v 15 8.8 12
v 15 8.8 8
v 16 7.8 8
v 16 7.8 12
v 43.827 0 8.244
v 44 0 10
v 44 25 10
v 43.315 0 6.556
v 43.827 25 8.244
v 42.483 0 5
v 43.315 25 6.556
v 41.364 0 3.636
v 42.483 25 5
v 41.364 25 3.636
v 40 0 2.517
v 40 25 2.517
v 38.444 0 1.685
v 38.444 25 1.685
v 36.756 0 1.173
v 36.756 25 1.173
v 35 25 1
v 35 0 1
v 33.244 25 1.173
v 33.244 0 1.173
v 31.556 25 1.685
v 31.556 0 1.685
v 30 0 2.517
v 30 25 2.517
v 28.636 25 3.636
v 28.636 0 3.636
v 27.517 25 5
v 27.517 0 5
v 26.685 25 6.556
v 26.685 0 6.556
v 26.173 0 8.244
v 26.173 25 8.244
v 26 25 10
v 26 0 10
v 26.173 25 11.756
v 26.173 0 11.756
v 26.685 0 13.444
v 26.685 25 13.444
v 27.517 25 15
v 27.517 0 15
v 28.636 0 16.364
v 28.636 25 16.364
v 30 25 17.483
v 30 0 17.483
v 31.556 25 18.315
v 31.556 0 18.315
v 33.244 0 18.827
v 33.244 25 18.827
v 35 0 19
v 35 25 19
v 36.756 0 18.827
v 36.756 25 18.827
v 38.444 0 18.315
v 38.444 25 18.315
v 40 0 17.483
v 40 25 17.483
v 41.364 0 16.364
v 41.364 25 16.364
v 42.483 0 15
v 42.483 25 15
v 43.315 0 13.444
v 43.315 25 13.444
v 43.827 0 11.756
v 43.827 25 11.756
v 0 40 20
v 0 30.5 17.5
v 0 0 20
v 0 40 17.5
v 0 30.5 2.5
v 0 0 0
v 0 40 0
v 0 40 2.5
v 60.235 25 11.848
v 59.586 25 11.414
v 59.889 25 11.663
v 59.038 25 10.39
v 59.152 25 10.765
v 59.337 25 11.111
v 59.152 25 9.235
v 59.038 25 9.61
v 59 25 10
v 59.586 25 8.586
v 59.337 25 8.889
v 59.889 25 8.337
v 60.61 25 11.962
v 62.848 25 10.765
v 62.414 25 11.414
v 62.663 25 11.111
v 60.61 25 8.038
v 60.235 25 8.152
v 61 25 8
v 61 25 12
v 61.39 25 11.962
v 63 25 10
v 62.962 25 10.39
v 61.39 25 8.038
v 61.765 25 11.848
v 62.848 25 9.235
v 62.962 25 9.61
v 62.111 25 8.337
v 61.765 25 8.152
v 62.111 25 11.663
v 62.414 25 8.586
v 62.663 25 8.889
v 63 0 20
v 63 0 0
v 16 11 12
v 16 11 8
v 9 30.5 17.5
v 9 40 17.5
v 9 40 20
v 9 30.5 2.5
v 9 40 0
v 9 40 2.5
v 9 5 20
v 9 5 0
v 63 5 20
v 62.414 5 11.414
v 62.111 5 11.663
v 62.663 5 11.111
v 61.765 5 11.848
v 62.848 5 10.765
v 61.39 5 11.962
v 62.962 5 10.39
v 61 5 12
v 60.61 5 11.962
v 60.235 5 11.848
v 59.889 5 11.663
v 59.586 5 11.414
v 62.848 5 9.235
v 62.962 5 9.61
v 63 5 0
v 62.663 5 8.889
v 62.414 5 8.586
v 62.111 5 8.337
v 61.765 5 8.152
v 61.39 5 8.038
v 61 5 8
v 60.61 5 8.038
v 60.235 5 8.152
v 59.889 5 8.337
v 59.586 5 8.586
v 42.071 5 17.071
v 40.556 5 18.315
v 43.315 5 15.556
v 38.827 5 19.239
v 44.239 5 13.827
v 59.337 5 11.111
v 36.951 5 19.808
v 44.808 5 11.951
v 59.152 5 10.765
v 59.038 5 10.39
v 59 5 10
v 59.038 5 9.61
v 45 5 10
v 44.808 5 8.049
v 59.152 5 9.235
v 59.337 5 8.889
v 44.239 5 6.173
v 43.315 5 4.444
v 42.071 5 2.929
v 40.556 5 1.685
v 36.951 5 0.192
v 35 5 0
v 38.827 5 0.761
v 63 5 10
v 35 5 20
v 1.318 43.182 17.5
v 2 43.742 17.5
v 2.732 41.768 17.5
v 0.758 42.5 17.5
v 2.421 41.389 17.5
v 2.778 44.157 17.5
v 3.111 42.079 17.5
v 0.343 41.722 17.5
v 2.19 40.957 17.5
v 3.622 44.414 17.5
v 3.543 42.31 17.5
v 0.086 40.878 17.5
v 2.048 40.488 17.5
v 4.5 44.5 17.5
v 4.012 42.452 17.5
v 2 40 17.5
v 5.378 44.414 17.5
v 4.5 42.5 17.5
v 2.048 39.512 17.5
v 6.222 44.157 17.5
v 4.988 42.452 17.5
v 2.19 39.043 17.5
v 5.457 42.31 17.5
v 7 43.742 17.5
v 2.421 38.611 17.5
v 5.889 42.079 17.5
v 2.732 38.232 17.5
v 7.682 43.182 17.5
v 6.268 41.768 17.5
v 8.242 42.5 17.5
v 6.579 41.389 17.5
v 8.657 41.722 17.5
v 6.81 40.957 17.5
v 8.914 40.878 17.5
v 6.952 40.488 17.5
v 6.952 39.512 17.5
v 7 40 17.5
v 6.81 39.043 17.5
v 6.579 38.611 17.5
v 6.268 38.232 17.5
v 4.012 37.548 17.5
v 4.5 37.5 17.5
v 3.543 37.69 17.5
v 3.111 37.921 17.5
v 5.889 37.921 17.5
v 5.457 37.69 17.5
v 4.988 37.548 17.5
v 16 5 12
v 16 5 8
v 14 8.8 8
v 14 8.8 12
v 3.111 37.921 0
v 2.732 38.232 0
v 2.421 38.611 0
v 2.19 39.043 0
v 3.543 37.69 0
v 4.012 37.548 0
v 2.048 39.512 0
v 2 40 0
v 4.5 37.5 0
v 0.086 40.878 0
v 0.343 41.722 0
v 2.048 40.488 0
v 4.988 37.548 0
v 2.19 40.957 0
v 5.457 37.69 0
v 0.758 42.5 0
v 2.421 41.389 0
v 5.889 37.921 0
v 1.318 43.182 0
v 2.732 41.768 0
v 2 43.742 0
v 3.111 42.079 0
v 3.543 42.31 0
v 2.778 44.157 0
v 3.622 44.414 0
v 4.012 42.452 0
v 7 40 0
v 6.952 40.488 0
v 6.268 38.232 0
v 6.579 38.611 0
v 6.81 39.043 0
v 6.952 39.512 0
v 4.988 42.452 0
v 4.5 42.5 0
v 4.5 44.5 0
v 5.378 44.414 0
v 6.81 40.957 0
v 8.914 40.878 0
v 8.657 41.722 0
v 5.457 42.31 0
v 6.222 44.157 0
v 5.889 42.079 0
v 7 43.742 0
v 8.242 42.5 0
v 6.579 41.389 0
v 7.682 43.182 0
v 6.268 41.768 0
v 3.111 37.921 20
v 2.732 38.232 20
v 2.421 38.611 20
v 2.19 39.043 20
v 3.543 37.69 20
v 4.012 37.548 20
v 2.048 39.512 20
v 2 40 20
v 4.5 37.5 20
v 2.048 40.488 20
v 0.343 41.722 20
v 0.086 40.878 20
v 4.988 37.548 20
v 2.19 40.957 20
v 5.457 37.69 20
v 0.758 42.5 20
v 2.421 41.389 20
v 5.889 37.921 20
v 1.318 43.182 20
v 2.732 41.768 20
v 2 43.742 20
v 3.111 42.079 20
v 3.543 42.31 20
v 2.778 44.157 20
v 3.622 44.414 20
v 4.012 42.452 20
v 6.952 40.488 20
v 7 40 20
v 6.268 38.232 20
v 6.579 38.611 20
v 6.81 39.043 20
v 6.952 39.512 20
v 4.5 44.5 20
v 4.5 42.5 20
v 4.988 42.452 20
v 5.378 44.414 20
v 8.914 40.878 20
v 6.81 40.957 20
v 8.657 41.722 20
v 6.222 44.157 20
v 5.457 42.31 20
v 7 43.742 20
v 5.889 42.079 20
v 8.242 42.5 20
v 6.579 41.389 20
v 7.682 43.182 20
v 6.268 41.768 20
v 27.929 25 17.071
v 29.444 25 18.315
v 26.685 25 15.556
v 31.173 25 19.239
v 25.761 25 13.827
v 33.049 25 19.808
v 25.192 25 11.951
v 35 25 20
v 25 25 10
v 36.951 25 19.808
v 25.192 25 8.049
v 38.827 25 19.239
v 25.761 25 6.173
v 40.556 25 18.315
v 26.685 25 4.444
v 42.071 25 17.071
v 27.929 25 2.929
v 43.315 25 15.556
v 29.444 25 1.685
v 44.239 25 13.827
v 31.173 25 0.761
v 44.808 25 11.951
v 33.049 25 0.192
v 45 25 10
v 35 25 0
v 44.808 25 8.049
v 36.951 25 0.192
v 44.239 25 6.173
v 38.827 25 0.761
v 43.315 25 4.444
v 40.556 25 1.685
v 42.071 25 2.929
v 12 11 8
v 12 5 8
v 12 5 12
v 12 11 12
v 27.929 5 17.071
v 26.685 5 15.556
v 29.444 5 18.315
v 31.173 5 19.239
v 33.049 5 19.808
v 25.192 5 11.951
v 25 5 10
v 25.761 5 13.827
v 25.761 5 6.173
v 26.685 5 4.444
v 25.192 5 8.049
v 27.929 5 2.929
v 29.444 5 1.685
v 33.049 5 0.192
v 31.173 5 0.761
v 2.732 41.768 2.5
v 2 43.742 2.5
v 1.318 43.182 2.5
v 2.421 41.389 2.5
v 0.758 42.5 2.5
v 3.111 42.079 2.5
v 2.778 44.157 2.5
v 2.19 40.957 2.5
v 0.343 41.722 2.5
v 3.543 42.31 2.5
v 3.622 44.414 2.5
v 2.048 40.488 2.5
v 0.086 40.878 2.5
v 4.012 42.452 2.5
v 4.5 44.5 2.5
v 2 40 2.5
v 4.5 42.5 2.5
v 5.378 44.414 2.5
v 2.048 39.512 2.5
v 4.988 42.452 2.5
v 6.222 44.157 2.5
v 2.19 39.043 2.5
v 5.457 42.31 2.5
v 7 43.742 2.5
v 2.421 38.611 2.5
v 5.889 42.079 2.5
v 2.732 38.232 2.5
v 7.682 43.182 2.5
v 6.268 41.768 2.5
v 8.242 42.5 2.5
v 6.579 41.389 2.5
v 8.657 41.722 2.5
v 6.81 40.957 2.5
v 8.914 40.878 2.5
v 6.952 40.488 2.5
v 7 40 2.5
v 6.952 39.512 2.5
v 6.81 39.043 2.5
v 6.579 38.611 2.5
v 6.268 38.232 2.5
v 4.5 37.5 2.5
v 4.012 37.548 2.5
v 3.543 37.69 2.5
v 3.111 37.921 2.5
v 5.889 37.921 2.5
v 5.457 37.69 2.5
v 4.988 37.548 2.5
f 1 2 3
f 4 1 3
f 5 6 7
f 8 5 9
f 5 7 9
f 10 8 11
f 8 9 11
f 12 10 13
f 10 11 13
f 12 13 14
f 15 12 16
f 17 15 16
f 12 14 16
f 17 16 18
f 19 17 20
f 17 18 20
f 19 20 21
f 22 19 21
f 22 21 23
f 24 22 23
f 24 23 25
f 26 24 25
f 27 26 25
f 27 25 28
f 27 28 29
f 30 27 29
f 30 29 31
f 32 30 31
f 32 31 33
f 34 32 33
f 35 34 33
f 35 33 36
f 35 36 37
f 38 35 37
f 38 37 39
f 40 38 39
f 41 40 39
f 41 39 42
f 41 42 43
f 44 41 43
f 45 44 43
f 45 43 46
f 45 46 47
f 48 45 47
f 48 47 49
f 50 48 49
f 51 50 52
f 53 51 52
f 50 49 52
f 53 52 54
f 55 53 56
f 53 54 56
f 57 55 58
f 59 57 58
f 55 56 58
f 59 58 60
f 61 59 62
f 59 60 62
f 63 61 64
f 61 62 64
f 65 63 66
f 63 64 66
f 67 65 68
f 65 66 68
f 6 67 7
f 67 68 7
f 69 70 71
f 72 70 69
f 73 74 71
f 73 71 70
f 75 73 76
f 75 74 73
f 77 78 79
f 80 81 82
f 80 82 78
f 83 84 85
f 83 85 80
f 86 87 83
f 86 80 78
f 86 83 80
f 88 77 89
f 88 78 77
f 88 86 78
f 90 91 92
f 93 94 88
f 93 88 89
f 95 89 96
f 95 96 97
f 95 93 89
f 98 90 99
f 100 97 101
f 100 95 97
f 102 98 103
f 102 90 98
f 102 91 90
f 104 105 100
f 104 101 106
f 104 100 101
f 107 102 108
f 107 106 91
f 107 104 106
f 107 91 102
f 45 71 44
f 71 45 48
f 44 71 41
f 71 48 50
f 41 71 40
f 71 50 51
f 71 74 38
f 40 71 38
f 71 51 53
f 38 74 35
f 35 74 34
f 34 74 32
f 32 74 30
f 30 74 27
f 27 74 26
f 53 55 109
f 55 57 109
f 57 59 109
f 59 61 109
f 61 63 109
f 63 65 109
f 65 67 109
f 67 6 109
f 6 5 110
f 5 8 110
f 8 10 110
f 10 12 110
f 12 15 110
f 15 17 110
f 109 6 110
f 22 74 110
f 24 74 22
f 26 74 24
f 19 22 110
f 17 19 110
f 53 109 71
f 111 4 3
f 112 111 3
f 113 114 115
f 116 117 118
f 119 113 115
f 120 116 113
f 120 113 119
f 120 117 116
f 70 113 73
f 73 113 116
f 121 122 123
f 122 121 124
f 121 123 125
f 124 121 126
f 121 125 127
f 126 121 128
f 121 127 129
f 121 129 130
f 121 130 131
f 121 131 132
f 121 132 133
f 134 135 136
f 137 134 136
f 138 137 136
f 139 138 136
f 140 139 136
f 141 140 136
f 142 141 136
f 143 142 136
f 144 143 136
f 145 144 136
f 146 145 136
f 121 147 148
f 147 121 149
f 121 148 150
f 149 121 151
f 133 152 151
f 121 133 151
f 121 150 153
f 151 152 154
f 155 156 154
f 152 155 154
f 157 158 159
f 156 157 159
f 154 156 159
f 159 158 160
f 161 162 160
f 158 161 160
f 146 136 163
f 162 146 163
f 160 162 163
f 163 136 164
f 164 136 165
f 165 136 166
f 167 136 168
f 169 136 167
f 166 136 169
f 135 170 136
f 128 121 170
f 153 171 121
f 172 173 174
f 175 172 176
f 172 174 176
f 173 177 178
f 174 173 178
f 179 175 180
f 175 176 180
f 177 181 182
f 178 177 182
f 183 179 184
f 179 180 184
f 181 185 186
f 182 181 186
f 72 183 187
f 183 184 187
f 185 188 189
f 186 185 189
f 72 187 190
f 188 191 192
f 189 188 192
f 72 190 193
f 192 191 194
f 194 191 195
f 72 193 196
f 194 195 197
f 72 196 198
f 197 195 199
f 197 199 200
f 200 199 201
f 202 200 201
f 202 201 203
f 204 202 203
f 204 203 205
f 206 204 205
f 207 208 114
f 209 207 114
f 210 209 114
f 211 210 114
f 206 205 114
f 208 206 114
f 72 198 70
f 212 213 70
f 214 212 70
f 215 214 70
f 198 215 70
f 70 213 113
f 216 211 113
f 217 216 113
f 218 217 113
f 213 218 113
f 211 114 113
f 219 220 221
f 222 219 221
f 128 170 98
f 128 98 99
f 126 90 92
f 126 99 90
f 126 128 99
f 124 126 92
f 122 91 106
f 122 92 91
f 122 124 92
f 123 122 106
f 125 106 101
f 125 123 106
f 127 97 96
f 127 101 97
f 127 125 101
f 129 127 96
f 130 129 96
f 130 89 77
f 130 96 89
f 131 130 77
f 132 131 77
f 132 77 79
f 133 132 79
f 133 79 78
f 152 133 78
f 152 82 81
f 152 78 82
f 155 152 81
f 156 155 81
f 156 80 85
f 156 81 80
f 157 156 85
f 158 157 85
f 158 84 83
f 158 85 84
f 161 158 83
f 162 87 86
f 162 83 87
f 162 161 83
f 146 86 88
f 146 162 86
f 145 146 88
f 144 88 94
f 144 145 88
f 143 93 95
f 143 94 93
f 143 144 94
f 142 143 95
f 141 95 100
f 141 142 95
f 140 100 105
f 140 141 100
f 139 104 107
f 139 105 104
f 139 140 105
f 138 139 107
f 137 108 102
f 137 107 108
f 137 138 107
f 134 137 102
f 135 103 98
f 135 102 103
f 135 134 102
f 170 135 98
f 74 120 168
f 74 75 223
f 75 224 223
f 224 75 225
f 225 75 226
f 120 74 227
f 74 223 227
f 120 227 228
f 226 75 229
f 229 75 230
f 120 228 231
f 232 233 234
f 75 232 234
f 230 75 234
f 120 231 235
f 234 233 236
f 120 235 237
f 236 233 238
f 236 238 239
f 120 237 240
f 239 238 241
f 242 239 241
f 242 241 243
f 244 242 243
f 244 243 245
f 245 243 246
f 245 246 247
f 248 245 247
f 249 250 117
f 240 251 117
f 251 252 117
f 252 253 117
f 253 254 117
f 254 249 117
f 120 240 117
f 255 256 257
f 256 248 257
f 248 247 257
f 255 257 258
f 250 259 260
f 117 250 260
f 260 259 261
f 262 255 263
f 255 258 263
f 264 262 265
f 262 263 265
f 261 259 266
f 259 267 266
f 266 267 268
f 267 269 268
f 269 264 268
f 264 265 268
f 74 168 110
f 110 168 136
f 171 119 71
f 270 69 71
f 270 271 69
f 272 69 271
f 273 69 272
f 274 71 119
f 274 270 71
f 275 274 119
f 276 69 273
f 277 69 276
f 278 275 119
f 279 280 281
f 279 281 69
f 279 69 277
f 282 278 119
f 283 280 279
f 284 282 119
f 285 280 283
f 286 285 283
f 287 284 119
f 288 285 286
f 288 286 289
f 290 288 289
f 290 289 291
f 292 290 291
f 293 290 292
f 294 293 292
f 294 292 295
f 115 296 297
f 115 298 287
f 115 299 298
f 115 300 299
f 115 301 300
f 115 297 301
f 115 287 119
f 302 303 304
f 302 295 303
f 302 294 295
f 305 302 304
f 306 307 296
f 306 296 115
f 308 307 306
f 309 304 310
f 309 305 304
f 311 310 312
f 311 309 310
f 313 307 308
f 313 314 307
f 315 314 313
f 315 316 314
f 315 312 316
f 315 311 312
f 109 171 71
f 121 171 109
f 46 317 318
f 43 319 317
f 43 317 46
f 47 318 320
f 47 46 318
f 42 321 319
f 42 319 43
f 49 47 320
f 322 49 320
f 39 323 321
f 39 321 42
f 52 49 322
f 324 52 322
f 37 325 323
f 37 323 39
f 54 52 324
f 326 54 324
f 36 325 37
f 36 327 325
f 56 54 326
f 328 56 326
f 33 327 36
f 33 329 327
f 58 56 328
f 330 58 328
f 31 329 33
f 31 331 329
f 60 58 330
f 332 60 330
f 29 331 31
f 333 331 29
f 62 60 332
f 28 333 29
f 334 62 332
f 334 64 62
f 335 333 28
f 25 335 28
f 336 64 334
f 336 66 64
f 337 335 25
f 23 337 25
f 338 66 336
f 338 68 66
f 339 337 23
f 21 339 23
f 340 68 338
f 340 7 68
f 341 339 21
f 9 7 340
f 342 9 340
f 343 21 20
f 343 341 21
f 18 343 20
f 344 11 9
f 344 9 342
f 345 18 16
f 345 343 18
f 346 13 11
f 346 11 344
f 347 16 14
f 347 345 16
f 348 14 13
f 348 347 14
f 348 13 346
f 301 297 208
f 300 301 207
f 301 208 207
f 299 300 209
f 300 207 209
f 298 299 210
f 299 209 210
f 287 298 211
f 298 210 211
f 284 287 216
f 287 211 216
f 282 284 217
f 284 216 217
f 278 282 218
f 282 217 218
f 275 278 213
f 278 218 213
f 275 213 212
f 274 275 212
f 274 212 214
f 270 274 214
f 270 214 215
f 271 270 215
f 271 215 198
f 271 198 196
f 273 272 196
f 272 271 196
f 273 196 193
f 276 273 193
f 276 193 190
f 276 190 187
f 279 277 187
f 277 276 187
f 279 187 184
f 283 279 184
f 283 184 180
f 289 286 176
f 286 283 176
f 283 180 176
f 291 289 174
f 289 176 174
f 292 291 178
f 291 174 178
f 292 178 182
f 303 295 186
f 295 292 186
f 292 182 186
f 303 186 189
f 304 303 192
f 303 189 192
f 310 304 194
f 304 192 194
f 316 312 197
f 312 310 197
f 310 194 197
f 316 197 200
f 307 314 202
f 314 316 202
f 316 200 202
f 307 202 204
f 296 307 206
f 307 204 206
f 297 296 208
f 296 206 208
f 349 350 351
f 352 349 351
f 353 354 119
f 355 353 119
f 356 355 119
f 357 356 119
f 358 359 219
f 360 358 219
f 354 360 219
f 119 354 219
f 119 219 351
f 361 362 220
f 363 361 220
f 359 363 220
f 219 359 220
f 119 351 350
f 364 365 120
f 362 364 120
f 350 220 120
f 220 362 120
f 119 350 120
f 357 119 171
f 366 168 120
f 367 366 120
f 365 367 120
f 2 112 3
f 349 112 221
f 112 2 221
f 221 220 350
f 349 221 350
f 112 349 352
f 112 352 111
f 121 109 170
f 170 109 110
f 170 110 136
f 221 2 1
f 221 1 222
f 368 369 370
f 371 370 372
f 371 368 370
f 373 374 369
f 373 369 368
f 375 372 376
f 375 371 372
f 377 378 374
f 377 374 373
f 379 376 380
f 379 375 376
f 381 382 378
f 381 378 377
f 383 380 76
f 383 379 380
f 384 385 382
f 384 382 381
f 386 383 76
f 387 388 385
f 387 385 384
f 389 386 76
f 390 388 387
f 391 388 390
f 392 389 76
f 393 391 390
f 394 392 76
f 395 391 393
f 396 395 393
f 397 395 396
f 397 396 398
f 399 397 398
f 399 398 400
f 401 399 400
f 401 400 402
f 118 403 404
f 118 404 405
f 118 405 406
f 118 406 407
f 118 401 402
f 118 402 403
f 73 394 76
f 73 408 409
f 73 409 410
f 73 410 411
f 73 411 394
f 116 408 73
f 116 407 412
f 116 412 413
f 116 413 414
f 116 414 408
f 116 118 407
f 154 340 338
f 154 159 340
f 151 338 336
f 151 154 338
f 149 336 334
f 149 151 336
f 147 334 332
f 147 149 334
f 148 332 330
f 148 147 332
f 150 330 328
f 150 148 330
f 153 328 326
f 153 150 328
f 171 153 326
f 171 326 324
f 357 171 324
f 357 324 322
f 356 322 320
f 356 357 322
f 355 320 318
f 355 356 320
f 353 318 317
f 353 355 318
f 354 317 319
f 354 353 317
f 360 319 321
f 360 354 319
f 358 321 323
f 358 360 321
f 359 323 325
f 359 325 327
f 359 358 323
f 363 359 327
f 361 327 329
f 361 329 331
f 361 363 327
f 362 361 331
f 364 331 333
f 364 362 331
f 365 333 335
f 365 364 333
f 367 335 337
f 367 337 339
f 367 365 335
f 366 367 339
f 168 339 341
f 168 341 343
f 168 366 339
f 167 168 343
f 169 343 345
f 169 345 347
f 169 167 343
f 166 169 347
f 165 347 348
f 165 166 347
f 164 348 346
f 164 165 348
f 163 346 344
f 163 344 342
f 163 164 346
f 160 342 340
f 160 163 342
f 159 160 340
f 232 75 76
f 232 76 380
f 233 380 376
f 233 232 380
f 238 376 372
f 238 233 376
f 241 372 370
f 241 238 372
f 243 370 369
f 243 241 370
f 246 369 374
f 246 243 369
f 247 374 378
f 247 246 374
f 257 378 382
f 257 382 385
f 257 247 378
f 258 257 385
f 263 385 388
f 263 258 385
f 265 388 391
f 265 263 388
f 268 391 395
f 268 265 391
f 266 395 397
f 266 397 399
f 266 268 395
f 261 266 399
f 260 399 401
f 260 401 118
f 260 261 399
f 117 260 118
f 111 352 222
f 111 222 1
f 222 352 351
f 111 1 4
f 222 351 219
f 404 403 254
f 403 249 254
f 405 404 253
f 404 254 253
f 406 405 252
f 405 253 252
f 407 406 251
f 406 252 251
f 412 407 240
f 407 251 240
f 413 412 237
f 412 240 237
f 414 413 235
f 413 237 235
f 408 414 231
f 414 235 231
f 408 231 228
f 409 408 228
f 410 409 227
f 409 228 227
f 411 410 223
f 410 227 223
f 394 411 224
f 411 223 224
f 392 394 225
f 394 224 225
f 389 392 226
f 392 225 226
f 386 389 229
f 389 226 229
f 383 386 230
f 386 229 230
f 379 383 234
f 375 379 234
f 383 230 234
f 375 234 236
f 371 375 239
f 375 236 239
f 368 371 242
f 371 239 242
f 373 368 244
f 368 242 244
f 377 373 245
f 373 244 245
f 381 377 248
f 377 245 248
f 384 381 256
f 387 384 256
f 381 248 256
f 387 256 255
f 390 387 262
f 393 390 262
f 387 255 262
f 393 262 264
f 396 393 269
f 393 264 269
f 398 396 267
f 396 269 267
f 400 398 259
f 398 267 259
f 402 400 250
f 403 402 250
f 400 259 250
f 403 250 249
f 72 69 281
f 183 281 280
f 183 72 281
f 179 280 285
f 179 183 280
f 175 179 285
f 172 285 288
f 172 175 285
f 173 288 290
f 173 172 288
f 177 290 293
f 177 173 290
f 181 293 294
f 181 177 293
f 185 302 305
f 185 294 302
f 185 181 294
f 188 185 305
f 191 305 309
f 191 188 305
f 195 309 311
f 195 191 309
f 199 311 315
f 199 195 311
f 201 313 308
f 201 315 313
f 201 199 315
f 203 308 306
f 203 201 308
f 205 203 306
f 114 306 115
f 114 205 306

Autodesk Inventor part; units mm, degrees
ref_plane "YZ Plane" through (0, 0, 0) normal (1, 0, 0) x (0, 1, 0)
ref_plane "XZ Plane" through (0, 0, 0) normal (0, 1, 0) x (-1, 0, 0)
ref_plane "XY Plane" through (0, 0, 0) normal (0, 0, 1) x (1, 0, 0)
sketch "Sketch1" plane through (0, 0, 0) normal (0, 0, 1) x (1, 0, 0)
  line L0 (0, 0) -> (0, 40)
  line L1 (0, 0) -> (63, 0)
  line L2 (63, 0) -> (63, 5)
  line L3 (63, 5) -> (9, 5)
  arc A0 (9, 40) -> (0, 40) centre (4.5, 40) ccw
  line L4 (9, 40) -> (9, 5)
  circle A1 centre (4.5, 40) radius 2.5
  dimension "d0" = 40
  dimension "d2" = 5
  dimension "d6" = 4.5
  dimension "d7" = 5
  dimension "d8" = 9
  dimension "d9" = 54
  dimension "d47" = 32.5
extrude "Extrusion1" add sketch "Sketch1" along normal blind 20
sketch "Sketch2" plane through (9, 5, 0) normal (0, 1, 0) x (1, 0, 0)
  line L0 (0, 0) -> (0, -20) projected
  circle A0 centre (26, -10) radius 10
  line L1 (0, 0) -> (54, 0) projected
  circle A1 centre (52, -10) radius 2
  line L2 (54, 0) -> (54, -20) projected
  point P0 (-9, 0)
  dimension "d14" = 20
  dimension "d16" = 26
  dimension "d20" = 4
  dimension "d21" = 10
  dimension "d22" = 14
sketch "Sketch6" plane through (9, 5, 0) normal (1, 0, 0) x (0, 0, -1)
  point P0 (0, -5)
sketch "Sketch7" plane through (9, 5, 0) normal (1, 0, 0) x (0, 0, -1)
  line L0 (-10, 41.0364) -> (-10, 39.6436)
  line L1 (0, 39.5) -> (-20, 39.5) projected
  line L2 (-2.5, 39.5) -> (-2.5, 25.5)
  line L3 (-17.5, 39.5) -> (-17.5, 25.5)
  line L4 (-17.5, 39.5) -> (-2.5, 39.5)
  line L5 (0, 32.5) -> (-20, 32.5) projected
  line L6 (-17.5, 25.5) -> (-2.5, 25.5)
  point P0 (0, -5)
  dimension "d40" = 14
  dimension "d41" = 14
  dimension "d42" = 15
extrude "Extrusion5" cut sketch "Sketch7" against normal blind 14
sketch "Sketch8" plane through (0, 0, 0) normal (0, 0, -1) x (-1, 0, 0)
  point P0 (0, 0)
extrude "Extrusion6" add sketch "Sketch2" along normal blind 20
sketch "Sketch9" plane through (35, 25, 10) normal (0, 1, 0) x (1, 0, 0)
  circle A0 centre (0, 0) radius 9
  point P0 (-35, 10)
  dimension "d50" = 18
extrude "Extrusion7" cut sketch "Sketch9" against normal blind 25
sketch "Sketch10" plane through (9, 5, 20) normal (0, 1, 0) x (1, 0, 0)
  line L0 (3, 8) -> (7, 8)
  line L1 (7, 8) -> (7, 12)
  line L2 (7, 12) -> (3, 12)
  line L3 (3, 12) -> (3, 8)
  line L4 (26, 0) -> (0, 0) projected
  line L5 (0, 2.5) -> (0, 17.5) projected
  point P0 (-9, 20)
  dimension "d53" = 4
  dimension "d54" = 4
  dimension "d55" = 8
  dimension "d56" = 3
extrude "Extrusion8" add sketch "Sketch10" along normal blind 6
sketch "Sketch11" plane through (16, 5, 8) normal (0, 0, -1) x (-1, 0, 0)
  line L0 (1, 3.8) -> (2, 3.8)
  line L1 (1, 3.8) -> (0, 2.8)
  line L2 (4, 0) -> (4, 6) projected
  line L3 (7, 0) -> (-19, 0) projected
  line L4 (0, 0) -> (4, 0) projected
  line L5 (0, 2.8) -> (0, 0)
  line L6 (0, 0) -> (2, 3.8)
  point P0 (16, -5)
  dimension "d59" = 2
  dimension "d60" = 1
  dimension "d61" = 3.8
  dimension "d62" = 2.8
extrude "Extrusion9" cut sketch "Sketch11" against normal blind 4
equation "\"d21\" = d19"
equation "\"d40\" = d41"
equation "\"d19\" = 0.5 * d14"
properties part number "ValveBaseMk2.2"
